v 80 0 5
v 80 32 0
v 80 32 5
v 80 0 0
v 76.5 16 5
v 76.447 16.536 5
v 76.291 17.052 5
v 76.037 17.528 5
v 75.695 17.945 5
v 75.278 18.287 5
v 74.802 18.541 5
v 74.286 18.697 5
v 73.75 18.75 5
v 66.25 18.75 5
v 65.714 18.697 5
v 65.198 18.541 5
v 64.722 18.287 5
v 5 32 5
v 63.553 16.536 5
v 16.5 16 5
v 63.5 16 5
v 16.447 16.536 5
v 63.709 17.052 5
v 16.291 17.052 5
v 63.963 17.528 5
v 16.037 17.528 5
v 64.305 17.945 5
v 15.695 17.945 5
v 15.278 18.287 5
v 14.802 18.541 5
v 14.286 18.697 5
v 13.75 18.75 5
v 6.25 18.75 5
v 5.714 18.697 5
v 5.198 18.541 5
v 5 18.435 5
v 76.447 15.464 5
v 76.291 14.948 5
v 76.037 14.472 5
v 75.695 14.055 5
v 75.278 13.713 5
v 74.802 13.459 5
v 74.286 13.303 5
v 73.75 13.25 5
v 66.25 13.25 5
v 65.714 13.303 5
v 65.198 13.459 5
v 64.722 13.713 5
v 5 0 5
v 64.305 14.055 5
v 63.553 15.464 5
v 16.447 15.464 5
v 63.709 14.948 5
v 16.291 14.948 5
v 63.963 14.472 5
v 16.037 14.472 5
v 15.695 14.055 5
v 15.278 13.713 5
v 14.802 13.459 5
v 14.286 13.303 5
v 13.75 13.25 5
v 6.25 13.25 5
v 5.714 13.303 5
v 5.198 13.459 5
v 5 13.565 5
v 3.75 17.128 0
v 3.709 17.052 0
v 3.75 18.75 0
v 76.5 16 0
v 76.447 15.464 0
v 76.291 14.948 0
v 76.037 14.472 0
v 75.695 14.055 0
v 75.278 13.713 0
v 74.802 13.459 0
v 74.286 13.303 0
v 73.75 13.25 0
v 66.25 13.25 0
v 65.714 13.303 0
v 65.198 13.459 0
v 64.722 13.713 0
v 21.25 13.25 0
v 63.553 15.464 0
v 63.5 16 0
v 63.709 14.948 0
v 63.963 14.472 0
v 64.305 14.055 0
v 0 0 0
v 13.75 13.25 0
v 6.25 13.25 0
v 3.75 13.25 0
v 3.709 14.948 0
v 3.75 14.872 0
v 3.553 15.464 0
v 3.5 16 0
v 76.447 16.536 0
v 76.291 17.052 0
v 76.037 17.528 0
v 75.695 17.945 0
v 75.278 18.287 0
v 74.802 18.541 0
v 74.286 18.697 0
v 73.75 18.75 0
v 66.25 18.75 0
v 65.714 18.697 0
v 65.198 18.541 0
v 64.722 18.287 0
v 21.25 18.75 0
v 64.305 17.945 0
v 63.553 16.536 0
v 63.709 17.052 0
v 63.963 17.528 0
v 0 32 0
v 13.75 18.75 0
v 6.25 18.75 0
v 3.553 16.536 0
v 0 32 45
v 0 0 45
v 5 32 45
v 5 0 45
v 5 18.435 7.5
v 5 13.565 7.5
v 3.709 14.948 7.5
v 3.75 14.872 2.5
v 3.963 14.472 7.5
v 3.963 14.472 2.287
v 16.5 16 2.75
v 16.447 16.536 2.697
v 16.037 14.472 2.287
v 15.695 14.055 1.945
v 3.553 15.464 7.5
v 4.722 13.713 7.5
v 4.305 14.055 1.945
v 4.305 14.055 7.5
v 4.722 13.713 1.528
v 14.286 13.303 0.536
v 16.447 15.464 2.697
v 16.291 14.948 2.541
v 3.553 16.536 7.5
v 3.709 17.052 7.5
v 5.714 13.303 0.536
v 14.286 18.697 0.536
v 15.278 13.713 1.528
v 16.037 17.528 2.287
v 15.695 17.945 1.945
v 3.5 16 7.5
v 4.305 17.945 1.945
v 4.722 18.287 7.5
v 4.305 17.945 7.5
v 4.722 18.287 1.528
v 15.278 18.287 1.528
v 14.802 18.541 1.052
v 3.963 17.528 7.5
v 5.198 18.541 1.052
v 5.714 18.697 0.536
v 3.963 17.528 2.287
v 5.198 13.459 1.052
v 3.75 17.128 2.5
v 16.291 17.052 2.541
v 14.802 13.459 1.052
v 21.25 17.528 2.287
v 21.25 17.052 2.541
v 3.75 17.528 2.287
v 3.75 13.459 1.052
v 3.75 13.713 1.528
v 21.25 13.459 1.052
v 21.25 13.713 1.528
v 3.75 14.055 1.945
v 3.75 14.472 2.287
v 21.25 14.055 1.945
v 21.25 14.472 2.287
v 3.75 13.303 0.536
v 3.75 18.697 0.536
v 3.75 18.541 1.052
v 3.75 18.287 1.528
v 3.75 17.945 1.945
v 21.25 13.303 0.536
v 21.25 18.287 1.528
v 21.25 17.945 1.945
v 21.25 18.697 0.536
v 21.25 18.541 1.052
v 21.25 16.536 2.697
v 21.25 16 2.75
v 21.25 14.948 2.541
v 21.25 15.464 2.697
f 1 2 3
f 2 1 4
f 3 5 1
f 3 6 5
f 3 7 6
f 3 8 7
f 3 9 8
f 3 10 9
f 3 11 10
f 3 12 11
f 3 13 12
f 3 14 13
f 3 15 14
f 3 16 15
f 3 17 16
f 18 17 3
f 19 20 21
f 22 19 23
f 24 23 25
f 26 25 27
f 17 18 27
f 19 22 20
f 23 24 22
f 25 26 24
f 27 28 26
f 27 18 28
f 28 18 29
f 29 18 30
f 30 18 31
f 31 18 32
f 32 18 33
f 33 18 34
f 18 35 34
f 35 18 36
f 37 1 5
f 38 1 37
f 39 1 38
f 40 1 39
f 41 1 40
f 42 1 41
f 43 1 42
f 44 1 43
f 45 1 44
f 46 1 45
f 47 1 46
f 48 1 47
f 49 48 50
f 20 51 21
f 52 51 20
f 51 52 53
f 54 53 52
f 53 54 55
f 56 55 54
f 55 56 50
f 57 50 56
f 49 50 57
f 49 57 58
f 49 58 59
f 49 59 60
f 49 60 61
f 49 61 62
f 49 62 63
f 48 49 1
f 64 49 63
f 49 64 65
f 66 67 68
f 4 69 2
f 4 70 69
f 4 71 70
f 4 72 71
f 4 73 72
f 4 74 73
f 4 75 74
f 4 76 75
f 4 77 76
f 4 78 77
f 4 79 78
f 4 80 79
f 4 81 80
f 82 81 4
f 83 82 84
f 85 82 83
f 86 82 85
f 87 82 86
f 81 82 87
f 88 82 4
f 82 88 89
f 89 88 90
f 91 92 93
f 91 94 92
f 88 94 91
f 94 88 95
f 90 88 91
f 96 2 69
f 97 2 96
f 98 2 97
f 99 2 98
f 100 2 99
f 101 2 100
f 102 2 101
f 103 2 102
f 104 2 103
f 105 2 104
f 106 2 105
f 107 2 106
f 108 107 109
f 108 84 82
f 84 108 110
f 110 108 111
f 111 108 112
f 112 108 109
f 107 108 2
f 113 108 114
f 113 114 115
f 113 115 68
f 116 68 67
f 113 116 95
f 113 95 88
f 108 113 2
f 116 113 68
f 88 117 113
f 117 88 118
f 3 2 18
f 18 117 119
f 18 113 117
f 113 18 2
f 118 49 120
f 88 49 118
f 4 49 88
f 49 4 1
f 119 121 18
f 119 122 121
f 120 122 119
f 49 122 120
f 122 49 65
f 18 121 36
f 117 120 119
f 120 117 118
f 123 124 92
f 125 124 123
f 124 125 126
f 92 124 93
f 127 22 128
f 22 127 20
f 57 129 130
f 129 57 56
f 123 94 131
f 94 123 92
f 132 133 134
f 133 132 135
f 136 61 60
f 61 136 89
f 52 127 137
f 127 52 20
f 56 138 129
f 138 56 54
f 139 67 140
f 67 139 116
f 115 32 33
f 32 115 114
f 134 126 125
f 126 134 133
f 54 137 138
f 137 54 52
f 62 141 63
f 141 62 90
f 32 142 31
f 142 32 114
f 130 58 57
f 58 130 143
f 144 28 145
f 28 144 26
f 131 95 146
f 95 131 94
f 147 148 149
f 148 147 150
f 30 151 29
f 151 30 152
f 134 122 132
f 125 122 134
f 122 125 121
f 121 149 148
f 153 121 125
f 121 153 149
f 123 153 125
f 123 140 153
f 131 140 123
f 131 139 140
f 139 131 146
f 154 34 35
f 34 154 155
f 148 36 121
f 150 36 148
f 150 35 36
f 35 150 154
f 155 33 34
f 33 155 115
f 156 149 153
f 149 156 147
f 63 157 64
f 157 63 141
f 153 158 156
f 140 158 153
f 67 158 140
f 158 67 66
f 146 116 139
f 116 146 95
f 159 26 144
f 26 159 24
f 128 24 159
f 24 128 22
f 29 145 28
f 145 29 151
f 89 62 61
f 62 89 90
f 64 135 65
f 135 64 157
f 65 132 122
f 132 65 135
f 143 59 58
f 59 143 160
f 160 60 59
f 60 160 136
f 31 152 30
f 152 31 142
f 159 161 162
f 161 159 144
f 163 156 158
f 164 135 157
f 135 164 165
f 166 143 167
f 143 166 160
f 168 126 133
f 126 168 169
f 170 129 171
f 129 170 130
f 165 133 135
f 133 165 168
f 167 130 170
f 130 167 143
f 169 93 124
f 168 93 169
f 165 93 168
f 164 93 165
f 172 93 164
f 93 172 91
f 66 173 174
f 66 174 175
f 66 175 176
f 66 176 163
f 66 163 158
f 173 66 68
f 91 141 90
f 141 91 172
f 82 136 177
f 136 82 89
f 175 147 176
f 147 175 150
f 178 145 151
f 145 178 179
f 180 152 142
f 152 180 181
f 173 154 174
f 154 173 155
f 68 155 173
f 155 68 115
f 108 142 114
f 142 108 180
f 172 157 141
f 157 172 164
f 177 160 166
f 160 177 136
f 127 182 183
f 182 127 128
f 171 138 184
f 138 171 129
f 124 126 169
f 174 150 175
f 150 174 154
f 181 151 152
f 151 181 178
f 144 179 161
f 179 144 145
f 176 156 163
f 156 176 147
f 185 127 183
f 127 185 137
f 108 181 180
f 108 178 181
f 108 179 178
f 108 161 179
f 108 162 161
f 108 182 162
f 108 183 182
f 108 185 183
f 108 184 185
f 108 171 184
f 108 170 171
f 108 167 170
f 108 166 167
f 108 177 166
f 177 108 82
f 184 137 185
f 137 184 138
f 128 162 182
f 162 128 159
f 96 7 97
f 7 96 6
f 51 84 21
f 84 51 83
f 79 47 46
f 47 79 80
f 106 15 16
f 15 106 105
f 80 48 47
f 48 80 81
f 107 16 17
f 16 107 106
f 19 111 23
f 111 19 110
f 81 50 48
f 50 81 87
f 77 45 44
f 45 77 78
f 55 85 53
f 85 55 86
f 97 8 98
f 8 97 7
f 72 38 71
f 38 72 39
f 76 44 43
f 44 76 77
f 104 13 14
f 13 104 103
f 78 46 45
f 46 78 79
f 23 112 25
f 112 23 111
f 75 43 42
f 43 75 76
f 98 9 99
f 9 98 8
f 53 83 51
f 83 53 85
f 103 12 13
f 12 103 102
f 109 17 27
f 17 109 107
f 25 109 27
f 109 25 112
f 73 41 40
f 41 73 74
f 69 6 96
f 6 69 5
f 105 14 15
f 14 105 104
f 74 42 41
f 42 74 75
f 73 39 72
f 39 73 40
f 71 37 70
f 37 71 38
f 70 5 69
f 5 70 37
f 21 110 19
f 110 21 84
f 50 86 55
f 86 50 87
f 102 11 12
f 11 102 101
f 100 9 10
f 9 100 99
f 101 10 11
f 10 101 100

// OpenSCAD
$fn = 32;

// ----------------------------------------------------------------------
// L-bracket: 80 x 32 x 45 mm
// ----------------------------------------------------------------------

// --- parameters (mm) ---
leg_a = 80;               // horizontal leg, X
leg_b = 45;               // vertical leg, Z
depth = 32;               // bracket depth, Y
thick = 5;                // plate thickness
hole_d = 4.5;             // clearance for M4
slot_w = 5.5;             // euro screw slot width
slot_l = 13;              // euro screw slot length

module hole_z(px, py) {
  translate([px, py, -2.5]) cylinder(h = thick + 5, d = hole_d);
}
module hole_x(pz, py) {
  translate([-2.5, py, pz]) rotate([0, 90, 0]) cylinder(h = thick + 5, d = hole_d);
}
module euro_slot_z(px, py) {
  hull() {
    translate([px - (slot_l - slot_w) / 2, py, -2.5]) cylinder(h = thick + 5, d = slot_w);
    translate([px + (slot_l - slot_w) / 2, py, -2.5]) cylinder(h = thick + 5, d = slot_w);
  }
}
module euro_slot_x(pz, py) {
  translate([-2.5, 0, 0]) rotate([0, 90, 0]) hull() {
    translate([0, py, pz - (slot_l - slot_w) / 2]) cylinder(h = thick + 5, d = slot_w);
    translate([0, py, pz + (slot_l - slot_w) / 2]) cylinder(h = thick + 5, d = slot_w);
  }
}

difference() {
  union() {
    /* horizontal leg */
    cube([leg_a, depth, thick]);
    /* vertical leg, overlapping the corner block */
    cube([thick, depth, leg_b]);
  }
  euro_slot_z(10, 16);
  euro_slot_x(10, 16);
  euro_slot_z(70, 16);
}
